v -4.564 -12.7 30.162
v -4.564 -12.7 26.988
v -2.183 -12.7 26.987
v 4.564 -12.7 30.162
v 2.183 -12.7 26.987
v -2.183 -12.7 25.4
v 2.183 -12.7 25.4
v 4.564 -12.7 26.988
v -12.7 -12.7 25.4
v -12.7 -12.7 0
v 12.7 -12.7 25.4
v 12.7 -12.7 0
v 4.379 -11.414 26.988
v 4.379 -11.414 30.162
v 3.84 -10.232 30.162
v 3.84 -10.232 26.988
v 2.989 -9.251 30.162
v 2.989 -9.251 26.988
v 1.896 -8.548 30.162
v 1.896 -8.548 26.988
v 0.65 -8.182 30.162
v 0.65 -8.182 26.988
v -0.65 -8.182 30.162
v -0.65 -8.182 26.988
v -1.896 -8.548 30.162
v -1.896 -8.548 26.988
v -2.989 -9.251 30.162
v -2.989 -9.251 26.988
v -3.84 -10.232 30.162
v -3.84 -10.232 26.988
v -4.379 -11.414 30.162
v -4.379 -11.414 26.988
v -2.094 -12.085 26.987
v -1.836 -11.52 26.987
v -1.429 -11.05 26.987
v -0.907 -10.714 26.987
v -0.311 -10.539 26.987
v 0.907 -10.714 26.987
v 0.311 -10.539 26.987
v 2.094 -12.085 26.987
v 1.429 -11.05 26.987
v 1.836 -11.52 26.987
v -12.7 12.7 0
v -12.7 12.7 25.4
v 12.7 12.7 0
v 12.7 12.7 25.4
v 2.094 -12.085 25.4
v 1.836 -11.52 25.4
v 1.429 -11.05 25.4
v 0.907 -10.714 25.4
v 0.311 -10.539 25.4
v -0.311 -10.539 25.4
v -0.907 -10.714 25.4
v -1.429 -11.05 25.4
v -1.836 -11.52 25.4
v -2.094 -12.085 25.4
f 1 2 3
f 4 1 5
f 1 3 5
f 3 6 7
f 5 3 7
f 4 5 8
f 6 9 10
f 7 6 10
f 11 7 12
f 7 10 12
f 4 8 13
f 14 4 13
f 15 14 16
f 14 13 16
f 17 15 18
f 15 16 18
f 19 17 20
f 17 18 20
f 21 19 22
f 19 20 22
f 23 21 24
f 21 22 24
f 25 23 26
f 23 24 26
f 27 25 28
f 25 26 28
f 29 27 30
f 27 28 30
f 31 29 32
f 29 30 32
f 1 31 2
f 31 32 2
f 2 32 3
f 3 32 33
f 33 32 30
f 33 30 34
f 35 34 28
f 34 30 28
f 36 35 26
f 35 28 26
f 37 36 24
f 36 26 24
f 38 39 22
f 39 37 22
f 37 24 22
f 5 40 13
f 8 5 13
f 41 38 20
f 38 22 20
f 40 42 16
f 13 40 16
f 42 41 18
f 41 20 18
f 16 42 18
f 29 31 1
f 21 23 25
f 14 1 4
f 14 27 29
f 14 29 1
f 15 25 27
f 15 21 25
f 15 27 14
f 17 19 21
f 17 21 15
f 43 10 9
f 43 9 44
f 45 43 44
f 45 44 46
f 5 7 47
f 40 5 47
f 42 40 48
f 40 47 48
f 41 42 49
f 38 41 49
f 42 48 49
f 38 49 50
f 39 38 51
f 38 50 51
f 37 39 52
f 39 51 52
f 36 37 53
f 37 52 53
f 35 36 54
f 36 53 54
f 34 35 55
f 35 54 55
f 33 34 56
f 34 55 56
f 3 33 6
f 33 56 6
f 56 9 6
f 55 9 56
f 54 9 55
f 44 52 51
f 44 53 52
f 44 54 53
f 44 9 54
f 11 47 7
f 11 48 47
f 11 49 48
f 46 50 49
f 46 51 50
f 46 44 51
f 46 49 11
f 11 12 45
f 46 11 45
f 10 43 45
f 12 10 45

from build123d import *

# Parameters (mm, degrees)
F0_W     = 25.4
F0_H     = 25.4
F1_DEPTH = 25.4
F3_DEPTH = 1.5875
F5_DEPTH = 3.175


with BuildPart() as f1:
    # F0 (on Top) → F1 (new body)
    with BuildSketch(Plane.XY):
        Rectangle(F0_W, F0_H)
    extrude(amount=F1_DEPTH)

    # F2 (on face) → F3 (join)
    with BuildSketch(Plane.XY.offset(25.4)):
        with BuildLine():
            Line((-2.182813, -12.7), (2.182813, -12.7))
            ThreePointArc((2.182813, -12.7), (0, -10.517188), (-2.182813, -12.7))
        make_face()
    extrude(amount=F3_DEPTH)

    # F4 (on face) → F5 (join)
    with BuildSketch(Plane.XY.offset(26.9875)):
        with BuildLine():
            Line((-4.564063, -12.7), (4.564063, -12.7))
            ThreePointArc((4.564063, -12.7), (0, -8.135938), (-4.564063, -12.7))
        make_face()
    extrude(amount=F5_DEPTH)


solid = f1.part
